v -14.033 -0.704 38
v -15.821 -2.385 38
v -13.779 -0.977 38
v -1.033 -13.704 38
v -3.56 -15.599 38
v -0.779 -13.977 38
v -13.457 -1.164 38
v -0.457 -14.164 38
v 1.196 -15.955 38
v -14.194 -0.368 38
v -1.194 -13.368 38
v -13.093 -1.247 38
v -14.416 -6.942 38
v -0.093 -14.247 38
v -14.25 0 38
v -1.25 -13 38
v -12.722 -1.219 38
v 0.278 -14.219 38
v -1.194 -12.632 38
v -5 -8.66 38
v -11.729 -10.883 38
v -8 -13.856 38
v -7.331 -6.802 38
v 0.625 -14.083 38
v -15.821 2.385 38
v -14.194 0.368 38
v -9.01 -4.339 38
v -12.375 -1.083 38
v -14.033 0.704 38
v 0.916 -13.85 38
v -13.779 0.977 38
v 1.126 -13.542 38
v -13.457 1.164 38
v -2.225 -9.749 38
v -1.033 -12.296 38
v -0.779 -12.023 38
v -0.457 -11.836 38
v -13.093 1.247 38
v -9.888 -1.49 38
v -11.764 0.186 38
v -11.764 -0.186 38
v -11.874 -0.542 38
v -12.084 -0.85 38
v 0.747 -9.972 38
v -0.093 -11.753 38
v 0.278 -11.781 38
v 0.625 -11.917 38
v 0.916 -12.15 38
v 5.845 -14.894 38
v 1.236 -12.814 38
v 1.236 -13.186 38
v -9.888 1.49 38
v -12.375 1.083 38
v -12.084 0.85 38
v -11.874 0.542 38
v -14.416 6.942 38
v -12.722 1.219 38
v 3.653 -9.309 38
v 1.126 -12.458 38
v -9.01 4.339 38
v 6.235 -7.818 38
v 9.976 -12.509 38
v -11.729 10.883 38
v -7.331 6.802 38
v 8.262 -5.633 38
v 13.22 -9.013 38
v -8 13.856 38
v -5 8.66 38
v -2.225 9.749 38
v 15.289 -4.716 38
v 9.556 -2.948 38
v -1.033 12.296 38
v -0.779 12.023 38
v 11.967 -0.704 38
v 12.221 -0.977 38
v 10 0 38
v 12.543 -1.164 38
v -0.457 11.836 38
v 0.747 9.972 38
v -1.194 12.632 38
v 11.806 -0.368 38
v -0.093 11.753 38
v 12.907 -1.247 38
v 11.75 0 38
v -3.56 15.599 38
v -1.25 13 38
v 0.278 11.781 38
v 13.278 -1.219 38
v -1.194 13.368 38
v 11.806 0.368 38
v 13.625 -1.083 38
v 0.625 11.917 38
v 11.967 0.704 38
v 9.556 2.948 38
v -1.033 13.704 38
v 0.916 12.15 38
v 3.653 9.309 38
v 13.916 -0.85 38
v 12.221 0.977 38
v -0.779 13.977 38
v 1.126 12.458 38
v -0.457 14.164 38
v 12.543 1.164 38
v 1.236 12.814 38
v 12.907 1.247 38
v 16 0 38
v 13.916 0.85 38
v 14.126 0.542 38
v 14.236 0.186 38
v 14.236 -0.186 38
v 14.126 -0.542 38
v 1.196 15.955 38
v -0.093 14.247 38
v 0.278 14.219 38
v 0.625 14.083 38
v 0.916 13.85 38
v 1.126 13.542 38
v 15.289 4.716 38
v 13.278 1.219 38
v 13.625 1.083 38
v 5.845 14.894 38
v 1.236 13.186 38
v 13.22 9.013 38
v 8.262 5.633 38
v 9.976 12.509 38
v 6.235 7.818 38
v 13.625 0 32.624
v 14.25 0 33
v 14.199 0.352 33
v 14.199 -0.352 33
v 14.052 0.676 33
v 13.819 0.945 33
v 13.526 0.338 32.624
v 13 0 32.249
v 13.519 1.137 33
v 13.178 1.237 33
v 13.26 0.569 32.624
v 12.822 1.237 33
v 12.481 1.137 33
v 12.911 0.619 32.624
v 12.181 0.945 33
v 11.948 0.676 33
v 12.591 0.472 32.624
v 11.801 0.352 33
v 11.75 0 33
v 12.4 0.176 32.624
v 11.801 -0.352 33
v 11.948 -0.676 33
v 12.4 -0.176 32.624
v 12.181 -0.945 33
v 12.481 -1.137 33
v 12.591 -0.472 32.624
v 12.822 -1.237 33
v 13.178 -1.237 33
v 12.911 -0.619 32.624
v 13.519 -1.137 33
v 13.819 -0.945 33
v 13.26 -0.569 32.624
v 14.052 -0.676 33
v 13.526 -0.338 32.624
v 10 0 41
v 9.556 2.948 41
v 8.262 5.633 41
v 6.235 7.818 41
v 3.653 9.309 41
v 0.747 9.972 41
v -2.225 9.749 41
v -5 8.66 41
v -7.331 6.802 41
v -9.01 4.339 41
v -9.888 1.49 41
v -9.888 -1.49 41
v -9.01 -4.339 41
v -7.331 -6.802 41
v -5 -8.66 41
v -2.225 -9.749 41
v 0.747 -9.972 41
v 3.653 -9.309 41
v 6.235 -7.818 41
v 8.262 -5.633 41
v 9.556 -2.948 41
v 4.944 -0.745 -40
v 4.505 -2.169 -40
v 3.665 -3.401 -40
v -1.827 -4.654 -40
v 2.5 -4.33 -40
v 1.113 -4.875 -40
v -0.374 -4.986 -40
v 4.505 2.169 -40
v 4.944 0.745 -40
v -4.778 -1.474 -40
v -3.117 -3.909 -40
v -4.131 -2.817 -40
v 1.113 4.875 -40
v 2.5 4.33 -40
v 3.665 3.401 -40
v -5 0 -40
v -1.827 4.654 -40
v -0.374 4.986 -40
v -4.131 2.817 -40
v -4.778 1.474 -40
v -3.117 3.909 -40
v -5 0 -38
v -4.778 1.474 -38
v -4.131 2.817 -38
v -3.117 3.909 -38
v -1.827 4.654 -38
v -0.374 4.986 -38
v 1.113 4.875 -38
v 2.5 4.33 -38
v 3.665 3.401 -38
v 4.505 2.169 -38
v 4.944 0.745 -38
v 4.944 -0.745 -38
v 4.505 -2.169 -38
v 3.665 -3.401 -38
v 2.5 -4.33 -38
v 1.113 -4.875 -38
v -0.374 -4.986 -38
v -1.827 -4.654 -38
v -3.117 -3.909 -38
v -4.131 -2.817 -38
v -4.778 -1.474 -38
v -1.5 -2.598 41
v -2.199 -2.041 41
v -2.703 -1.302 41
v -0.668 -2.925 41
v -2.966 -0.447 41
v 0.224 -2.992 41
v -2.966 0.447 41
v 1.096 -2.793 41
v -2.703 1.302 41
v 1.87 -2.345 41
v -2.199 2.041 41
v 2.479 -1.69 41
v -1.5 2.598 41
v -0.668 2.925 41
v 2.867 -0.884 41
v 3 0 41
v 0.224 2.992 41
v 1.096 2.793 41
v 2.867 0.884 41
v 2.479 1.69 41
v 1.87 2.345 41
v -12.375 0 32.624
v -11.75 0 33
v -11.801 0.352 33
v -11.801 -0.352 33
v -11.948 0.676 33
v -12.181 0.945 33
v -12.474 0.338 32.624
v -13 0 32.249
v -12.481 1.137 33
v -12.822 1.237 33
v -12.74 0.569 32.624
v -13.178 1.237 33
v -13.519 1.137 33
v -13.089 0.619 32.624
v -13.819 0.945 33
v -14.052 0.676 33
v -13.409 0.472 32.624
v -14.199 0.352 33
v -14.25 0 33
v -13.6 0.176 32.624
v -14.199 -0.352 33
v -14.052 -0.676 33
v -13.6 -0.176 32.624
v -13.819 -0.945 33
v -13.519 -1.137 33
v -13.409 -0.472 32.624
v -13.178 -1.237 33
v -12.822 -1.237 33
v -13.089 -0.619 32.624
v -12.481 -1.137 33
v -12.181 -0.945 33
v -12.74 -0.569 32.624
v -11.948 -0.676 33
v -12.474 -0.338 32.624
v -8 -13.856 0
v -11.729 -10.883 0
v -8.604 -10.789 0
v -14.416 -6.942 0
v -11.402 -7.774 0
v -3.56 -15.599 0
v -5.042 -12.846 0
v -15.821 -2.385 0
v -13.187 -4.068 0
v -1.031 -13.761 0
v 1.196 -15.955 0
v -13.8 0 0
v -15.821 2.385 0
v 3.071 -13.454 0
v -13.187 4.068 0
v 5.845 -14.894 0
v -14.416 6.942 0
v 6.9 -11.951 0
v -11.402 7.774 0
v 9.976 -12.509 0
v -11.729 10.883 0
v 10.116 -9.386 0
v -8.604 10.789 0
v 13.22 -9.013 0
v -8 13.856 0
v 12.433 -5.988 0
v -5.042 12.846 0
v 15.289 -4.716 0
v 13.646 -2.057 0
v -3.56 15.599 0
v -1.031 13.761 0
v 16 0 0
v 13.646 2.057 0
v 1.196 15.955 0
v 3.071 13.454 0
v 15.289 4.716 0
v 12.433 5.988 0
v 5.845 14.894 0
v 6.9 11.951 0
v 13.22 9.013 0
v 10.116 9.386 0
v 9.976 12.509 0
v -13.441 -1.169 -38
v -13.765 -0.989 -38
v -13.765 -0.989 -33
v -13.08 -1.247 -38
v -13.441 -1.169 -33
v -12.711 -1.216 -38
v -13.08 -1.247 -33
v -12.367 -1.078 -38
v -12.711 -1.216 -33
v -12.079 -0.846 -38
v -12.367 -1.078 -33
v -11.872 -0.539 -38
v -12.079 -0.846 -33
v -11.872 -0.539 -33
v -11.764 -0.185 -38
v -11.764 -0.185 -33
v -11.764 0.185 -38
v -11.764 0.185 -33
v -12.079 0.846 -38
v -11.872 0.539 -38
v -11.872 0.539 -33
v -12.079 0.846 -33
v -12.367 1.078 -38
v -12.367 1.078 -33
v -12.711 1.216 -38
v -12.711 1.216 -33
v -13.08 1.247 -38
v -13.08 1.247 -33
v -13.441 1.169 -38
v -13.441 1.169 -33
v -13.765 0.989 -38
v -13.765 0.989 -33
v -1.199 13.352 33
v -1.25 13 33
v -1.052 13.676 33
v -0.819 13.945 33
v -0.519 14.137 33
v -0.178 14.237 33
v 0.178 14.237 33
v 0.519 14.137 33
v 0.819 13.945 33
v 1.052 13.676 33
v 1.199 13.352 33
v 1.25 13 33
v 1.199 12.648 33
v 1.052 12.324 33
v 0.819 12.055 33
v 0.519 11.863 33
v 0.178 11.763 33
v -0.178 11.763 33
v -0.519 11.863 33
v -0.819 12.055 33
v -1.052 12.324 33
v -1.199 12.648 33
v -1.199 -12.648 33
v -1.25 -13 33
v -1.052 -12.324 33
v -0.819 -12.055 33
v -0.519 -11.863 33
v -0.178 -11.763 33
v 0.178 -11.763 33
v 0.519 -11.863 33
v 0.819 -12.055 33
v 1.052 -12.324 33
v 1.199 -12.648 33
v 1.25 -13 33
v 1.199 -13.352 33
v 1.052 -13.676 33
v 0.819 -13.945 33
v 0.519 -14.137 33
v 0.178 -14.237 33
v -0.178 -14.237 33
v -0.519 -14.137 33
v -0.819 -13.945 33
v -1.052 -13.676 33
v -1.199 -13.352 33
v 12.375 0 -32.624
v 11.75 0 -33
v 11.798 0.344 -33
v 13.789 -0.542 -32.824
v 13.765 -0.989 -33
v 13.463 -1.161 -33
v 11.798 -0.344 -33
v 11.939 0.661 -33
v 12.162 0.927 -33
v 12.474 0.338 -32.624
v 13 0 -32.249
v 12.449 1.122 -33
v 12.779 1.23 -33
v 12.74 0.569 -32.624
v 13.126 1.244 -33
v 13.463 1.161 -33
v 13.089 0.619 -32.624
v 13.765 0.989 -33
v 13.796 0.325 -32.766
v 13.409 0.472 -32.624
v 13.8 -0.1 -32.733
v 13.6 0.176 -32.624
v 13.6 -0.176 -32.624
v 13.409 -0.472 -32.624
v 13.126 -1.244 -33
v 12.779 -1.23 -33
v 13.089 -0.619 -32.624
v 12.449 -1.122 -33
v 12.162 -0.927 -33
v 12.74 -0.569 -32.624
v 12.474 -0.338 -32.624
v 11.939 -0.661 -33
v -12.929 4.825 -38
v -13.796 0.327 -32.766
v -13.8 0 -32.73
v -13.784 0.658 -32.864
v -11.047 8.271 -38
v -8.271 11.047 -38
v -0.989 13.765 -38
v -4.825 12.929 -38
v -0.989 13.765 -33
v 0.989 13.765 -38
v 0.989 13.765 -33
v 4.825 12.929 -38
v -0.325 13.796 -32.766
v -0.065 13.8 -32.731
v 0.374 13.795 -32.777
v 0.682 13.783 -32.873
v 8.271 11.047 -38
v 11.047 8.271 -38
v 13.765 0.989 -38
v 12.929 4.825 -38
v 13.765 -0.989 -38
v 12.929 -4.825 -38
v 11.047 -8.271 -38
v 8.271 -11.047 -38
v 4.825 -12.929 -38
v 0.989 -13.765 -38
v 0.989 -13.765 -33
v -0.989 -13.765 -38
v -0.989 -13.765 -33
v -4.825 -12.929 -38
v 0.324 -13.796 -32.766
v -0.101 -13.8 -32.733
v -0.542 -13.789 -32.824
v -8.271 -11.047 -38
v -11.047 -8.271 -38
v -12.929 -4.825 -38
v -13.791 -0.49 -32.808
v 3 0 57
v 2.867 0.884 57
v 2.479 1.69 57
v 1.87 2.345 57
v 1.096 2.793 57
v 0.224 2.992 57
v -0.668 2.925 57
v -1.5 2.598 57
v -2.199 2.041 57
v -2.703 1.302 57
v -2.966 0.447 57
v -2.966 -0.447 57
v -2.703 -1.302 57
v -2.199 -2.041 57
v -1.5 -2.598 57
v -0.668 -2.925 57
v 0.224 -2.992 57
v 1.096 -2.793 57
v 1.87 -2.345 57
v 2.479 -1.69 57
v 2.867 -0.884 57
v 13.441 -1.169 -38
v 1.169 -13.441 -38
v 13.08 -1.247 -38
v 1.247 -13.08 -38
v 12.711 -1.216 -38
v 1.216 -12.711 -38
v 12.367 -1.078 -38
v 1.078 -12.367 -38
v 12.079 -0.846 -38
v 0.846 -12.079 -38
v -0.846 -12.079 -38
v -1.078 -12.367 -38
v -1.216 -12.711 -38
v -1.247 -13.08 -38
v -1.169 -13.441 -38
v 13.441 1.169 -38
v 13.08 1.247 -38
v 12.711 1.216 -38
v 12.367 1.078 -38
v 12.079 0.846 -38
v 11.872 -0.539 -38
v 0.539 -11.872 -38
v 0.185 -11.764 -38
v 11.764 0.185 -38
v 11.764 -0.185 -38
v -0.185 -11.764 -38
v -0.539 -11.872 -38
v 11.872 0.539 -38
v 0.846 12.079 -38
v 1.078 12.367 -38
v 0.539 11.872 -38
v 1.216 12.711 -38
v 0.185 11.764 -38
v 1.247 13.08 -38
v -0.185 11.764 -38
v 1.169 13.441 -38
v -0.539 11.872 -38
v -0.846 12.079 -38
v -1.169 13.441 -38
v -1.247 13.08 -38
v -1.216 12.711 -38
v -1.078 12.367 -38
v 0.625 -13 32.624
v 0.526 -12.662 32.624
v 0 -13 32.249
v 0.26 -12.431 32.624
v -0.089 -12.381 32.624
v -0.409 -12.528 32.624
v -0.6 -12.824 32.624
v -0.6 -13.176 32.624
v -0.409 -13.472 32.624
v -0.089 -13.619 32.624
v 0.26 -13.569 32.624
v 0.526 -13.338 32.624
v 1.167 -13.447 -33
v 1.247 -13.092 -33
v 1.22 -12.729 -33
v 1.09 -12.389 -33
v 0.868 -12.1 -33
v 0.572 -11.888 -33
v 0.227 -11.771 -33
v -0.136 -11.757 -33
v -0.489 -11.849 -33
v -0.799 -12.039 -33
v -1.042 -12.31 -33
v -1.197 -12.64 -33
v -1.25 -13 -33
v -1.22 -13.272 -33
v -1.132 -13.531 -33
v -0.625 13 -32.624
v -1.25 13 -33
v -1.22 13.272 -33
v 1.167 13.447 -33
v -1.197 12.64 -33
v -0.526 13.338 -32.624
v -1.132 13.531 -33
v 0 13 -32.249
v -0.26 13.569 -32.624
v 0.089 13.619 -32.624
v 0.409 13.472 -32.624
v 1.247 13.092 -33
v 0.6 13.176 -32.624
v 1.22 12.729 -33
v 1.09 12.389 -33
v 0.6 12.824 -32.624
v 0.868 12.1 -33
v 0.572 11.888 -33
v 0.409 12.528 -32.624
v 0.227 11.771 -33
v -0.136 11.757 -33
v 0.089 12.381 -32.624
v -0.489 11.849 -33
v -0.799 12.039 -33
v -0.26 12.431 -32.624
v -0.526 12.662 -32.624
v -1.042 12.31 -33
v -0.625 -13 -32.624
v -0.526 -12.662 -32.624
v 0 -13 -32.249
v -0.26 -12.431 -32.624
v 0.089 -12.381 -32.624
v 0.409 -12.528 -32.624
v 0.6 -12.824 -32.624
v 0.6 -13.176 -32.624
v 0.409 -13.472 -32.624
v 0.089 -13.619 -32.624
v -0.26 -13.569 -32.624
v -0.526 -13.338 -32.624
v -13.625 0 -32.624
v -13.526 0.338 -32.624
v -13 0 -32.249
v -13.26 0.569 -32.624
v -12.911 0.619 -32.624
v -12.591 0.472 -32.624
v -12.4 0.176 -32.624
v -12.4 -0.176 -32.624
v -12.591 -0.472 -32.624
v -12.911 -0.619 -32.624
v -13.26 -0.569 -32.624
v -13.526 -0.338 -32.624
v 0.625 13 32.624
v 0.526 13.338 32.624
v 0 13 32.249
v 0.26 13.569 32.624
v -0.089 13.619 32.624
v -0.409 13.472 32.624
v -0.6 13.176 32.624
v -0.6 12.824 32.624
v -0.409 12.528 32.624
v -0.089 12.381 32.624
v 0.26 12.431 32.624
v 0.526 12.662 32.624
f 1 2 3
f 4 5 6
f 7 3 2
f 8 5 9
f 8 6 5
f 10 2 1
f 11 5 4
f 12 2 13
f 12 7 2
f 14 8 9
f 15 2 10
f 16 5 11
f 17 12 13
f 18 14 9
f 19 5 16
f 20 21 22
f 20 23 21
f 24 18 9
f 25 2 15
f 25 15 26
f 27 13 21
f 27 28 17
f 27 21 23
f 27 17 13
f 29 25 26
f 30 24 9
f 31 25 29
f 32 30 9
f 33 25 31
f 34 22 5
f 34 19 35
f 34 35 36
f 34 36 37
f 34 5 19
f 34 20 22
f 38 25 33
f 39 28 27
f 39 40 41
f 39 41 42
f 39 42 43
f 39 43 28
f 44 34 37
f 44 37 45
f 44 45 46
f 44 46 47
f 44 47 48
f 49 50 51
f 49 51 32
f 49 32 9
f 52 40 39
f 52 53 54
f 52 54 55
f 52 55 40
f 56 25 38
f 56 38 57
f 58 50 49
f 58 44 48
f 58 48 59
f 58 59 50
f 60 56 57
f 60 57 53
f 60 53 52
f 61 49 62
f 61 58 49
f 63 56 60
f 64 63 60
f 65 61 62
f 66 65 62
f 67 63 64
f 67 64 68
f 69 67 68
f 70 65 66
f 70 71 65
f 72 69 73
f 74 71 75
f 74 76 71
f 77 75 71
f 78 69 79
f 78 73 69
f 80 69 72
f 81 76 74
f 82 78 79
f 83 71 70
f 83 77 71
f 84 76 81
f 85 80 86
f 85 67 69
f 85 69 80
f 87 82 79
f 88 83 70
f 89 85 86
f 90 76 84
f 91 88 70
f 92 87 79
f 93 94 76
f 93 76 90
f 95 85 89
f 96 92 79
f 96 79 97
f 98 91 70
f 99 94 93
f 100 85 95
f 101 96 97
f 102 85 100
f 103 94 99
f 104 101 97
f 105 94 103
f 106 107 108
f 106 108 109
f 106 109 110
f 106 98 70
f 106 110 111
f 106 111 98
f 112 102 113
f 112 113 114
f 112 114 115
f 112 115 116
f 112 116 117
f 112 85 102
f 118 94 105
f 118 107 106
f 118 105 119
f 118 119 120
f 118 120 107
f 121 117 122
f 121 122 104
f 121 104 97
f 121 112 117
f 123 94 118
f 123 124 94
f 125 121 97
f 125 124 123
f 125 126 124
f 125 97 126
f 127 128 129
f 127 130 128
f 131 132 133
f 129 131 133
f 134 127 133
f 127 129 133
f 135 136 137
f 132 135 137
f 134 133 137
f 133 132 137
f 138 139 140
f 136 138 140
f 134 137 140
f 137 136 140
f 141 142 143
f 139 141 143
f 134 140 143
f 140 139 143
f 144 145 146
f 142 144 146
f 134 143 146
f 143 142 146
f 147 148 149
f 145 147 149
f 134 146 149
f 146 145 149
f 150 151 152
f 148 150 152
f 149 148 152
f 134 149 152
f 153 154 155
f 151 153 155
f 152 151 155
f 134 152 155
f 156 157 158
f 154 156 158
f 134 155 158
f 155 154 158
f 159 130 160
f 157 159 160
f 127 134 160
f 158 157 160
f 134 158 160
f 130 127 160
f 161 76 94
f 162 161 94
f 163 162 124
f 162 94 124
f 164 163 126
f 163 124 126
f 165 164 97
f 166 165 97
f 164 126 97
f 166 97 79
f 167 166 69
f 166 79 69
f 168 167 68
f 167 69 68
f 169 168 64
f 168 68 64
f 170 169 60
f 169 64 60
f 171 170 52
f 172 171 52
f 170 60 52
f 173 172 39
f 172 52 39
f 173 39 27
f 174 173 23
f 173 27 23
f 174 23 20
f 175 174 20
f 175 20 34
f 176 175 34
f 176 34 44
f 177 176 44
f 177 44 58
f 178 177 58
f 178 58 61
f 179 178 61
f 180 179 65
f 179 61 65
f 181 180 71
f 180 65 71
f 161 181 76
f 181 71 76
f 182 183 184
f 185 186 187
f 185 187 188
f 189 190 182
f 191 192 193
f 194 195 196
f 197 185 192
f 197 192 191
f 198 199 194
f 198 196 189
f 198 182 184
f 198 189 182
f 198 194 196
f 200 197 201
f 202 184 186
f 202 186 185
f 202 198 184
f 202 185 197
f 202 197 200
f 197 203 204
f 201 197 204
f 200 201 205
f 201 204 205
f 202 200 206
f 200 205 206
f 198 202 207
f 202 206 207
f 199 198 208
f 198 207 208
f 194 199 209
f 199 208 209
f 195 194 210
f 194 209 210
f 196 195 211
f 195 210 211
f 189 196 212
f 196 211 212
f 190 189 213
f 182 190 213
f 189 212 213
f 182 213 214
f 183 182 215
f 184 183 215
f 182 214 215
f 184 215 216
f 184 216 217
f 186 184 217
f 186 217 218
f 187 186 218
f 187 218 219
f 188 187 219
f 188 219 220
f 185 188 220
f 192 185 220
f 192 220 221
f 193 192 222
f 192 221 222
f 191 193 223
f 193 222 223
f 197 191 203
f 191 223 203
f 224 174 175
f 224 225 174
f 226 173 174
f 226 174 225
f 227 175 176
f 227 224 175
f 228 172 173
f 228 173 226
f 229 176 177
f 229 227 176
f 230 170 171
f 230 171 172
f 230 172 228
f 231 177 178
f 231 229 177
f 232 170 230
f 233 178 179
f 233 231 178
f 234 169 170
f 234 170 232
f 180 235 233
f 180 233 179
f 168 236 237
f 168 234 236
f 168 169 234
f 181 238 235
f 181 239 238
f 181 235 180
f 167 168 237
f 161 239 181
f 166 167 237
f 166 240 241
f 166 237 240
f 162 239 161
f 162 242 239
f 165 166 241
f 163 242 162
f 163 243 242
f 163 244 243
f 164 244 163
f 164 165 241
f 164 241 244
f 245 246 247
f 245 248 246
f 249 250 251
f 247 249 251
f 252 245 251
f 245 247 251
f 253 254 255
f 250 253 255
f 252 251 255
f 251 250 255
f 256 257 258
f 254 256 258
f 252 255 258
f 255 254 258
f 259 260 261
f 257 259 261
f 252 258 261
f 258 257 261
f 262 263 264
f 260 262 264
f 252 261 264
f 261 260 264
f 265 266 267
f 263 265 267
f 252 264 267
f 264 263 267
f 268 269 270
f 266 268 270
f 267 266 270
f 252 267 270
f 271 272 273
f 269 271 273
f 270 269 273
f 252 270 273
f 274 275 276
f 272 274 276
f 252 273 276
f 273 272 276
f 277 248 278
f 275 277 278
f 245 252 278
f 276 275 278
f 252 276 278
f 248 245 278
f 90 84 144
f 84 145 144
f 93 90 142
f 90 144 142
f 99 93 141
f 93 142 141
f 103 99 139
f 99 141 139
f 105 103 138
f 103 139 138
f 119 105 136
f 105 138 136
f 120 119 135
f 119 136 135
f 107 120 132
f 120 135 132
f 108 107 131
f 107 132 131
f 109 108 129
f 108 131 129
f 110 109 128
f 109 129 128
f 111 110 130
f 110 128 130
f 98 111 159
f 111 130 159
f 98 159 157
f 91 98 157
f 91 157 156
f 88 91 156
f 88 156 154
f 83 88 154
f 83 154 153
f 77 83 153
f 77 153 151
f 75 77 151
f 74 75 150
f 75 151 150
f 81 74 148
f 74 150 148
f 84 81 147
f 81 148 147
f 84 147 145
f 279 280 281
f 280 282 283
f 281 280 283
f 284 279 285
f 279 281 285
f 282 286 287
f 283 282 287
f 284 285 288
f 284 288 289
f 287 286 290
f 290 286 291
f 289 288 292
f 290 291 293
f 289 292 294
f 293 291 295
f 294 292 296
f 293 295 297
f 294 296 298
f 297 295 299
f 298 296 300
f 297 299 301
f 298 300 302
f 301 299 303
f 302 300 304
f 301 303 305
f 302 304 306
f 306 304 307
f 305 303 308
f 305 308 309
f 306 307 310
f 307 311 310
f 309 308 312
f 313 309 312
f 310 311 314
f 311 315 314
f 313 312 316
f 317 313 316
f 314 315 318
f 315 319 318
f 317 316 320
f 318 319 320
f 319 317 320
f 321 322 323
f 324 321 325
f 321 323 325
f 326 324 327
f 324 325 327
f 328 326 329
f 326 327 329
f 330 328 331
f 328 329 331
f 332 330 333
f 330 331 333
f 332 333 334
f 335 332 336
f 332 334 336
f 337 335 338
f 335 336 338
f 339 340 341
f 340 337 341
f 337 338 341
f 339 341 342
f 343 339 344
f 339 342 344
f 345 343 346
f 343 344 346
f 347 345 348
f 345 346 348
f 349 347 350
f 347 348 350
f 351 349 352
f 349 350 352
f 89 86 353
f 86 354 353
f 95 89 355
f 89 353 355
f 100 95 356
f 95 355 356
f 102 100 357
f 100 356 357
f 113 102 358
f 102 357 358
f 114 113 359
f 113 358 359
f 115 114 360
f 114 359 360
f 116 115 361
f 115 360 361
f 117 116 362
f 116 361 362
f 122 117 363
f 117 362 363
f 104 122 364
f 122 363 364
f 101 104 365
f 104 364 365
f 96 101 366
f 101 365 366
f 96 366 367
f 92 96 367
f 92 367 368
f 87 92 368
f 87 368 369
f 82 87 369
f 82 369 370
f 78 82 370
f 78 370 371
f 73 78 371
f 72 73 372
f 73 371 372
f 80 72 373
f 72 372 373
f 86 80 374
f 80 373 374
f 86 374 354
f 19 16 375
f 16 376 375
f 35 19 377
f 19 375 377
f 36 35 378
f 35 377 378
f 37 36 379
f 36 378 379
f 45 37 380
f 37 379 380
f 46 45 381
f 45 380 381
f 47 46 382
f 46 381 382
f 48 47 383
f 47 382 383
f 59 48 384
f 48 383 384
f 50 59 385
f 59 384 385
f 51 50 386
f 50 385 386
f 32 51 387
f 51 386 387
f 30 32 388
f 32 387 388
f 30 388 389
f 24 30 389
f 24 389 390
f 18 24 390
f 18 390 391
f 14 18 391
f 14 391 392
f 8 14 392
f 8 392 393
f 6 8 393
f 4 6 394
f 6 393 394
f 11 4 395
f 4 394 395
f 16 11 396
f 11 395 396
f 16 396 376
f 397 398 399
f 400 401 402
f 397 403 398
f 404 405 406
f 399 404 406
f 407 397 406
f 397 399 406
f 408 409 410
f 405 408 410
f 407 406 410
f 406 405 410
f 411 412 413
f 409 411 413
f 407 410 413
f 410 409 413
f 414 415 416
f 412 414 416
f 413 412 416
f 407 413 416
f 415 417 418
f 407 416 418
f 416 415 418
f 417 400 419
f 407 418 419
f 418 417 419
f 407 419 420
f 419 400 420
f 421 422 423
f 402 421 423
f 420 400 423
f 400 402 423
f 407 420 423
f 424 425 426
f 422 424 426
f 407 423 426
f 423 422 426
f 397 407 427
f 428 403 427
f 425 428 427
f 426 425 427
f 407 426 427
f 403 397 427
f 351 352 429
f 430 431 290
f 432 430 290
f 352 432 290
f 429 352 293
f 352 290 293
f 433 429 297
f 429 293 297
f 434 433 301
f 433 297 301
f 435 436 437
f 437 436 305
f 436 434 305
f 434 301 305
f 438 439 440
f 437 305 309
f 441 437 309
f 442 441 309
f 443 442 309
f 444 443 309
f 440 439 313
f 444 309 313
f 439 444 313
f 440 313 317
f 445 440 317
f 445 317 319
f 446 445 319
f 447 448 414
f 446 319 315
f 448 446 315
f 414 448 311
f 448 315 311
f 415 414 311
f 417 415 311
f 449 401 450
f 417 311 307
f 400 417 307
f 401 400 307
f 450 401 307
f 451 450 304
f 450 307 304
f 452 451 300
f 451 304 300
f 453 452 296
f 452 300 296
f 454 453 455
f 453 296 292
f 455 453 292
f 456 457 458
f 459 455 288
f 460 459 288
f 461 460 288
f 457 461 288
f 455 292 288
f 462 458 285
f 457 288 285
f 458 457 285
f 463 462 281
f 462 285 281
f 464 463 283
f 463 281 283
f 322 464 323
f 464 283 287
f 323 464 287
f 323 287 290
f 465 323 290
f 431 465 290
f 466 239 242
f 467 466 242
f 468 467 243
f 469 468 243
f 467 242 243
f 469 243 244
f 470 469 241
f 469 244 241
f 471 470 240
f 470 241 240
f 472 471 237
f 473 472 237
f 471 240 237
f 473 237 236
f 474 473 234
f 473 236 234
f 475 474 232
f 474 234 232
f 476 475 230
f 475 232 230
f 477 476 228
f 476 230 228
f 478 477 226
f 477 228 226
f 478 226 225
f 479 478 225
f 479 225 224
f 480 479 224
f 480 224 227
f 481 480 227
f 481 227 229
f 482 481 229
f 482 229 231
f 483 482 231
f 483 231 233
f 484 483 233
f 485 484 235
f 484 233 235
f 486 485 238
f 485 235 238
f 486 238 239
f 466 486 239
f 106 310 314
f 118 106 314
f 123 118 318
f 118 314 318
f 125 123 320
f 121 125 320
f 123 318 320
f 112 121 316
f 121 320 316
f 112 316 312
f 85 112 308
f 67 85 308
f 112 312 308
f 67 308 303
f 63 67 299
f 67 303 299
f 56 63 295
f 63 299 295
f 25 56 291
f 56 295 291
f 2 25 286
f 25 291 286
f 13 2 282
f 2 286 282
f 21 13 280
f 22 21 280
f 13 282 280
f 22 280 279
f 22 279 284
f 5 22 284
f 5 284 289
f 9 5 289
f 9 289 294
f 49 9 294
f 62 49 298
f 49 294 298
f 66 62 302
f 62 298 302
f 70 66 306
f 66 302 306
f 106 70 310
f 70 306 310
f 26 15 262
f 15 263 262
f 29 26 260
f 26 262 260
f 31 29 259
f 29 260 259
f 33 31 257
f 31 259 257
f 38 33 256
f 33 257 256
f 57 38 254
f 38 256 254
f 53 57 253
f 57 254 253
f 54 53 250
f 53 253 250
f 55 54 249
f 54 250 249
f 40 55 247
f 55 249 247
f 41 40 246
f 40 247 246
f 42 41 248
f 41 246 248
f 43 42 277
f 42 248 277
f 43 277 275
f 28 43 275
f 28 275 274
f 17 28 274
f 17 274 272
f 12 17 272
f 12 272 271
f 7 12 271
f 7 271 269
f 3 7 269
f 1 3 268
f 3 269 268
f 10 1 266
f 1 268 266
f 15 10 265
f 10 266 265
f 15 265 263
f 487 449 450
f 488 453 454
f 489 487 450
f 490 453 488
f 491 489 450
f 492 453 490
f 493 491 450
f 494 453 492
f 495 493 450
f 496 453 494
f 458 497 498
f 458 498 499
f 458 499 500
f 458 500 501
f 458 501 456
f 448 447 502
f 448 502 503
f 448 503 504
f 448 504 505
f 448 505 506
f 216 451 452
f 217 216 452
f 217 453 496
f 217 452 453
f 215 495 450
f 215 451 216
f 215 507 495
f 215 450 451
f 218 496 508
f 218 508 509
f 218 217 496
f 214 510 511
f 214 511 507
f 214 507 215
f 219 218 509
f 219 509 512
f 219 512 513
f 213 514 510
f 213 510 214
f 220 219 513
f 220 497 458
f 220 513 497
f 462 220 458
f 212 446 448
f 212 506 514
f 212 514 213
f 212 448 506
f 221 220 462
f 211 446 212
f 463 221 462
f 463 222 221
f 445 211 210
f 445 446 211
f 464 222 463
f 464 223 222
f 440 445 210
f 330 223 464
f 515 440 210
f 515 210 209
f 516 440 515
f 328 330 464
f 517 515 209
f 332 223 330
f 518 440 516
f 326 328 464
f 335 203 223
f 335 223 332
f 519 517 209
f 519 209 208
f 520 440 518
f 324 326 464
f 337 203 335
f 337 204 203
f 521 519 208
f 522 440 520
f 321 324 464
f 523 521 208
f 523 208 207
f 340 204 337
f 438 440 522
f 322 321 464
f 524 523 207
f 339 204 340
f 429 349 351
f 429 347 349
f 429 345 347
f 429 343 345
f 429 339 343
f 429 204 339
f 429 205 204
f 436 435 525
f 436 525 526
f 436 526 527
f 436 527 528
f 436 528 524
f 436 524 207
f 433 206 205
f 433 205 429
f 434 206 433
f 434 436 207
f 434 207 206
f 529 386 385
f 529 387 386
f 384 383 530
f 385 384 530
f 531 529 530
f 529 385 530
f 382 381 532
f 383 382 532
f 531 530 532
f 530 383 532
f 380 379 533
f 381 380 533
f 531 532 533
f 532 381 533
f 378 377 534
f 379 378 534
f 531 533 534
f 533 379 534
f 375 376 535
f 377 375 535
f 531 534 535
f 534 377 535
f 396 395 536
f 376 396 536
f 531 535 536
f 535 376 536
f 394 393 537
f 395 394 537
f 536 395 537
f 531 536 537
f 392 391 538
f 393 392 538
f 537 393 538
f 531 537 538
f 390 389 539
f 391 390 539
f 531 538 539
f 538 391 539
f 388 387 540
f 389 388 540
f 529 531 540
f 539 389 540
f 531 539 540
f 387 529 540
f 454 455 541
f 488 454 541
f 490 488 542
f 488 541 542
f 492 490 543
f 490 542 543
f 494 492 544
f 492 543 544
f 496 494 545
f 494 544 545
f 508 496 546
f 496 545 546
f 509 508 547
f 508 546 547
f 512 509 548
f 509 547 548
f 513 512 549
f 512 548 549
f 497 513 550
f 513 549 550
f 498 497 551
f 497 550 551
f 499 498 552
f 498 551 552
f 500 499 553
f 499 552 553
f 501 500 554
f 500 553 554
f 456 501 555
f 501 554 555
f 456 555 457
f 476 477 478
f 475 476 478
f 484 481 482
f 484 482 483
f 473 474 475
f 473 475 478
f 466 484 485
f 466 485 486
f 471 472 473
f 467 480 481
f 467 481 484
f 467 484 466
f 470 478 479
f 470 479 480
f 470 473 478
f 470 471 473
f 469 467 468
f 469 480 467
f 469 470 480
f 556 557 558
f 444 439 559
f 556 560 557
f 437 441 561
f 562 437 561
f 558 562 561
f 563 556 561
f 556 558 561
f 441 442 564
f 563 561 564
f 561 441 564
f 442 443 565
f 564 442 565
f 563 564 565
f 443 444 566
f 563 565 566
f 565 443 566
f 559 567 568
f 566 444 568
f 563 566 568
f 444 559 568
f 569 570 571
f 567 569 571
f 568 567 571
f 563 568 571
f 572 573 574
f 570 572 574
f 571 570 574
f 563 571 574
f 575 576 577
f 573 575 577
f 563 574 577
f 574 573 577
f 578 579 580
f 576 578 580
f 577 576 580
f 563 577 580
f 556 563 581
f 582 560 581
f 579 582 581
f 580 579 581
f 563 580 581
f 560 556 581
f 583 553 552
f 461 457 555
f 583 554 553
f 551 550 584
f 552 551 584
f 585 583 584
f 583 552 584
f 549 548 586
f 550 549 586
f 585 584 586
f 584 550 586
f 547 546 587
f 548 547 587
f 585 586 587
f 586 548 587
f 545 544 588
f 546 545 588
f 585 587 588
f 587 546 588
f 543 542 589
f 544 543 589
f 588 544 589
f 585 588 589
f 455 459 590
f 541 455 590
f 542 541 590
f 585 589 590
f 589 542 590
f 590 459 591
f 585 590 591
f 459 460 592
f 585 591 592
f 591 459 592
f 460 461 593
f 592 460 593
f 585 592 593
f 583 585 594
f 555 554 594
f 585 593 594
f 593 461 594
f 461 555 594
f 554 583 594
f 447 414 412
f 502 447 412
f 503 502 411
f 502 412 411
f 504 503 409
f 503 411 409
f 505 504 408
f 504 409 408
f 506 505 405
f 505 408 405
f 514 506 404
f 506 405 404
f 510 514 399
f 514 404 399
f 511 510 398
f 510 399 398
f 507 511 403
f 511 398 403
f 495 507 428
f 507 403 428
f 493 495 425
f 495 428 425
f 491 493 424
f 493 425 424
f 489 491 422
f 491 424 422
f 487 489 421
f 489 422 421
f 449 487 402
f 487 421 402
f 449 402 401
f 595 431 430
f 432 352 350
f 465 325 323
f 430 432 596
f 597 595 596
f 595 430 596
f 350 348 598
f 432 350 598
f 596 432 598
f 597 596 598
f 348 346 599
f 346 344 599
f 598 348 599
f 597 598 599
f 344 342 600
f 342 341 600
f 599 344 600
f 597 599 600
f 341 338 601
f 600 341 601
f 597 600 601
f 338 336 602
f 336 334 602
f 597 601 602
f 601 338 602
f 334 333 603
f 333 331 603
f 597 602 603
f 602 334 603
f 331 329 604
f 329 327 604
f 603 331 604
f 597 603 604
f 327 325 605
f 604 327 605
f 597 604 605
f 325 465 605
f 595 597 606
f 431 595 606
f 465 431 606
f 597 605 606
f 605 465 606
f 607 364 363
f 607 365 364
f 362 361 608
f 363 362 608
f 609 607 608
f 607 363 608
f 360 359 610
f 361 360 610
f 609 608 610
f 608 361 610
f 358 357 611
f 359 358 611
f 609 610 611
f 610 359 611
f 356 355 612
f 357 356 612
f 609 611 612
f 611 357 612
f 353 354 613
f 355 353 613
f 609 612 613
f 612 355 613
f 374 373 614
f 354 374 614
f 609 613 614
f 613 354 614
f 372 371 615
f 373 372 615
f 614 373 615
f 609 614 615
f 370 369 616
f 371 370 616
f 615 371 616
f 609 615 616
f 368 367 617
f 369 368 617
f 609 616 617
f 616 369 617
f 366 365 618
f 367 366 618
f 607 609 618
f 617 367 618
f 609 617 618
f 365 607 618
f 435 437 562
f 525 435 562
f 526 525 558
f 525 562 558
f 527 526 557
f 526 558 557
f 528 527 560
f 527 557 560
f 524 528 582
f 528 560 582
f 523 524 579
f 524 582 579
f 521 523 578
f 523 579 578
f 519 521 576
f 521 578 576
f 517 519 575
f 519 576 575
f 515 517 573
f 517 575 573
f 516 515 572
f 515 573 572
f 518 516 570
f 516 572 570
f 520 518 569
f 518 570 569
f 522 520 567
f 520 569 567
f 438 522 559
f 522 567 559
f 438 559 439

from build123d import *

# Parameters (mm, degrees)
SKETCH1_R                   = 16
BOSS_EXTRUDE1_DEPTH         = 38
SKETCH2_R                   = 13.8
BOSS_EXTRUDE2_DEPTH         = 38
SKETCH3_R                   = 5
BOSS_EXTRUDE3_DEPTH         = 2
SKETCH4_R                   = 10
BOSS_EXTRUDE4_DEPTH         = 3
SKETCH5_R                   = 3
BOSS_EXTRUDE5_DEPTH         = 16
TAP_DRILL_FOR_M3_TAP1_D     = 2.5
TAP_DRILL_FOR_M3_TAP1_DEPTH = 5
TAP_DRILL_FOR_M3_TAP1_TIP   = 0.751075774
TAP_DRILL_FOR_M3_TAP2_D     = 2.5
TAP_DRILL_FOR_M3_TAP2_DEPTH = 5
TAP_DRILL_FOR_M3_TAP2_TIP   = 0.751075774


with BuildPart() as part:
    # Sketch1 → Boss-Extrude1 (new body)
    with BuildSketch(Plane.XY):
        Circle(SKETCH1_R)
    extrude(amount=BOSS_EXTRUDE1_DEPTH)

    # Sketch2 → Boss-Extrude2 (add)
    with BuildSketch(Plane(origin=(0, 0, 0), x_dir=(-1, 0, 0), z_dir=(0, 0, -1))):
        Circle(SKETCH2_R)
    extrude(amount=BOSS_EXTRUDE2_DEPTH)

    # Sketch3 → Boss-Extrude3 (add)
    with BuildSketch(Plane(origin=(0, 0, -38), x_dir=(-1, 0, 0), z_dir=(0, 0, -1))):
        Circle(SKETCH3_R)
    extrude(amount=BOSS_EXTRUDE3_DEPTH)

    # Sketch4 → Boss-Extrude4 (add)
    with BuildSketch(Plane.XY.offset(38)):
        Circle(SKETCH4_R)
    extrude(amount=BOSS_EXTRUDE4_DEPTH)

    # Sketch5 → Boss-Extrude5 (add)
    with BuildSketch(Plane.XY.offset(41)):
        Circle(SKETCH5_R)
    extrude(amount=BOSS_EXTRUDE5_DEPTH)

    # Tap Drill for M3 Tap1
    with Locations(Plane(origin=(0, 0, -38), x_dir=(-1, 0, 0), z_dir=(0, 0, -1))):
        with Locations((-13, 0), (0, -13), (13, 0), (0, 13)):
            Hole(TAP_DRILL_FOR_M3_TAP1_D / 2, depth=TAP_DRILL_FOR_M3_TAP1_DEPTH)
            with Locations((0, 0, -(TAP_DRILL_FOR_M3_TAP1_DEPTH + TAP_DRILL_FOR_M3_TAP1_TIP / 2))):  # 118° drill point
                Cone(0, TAP_DRILL_FOR_M3_TAP1_D / 2, TAP_DRILL_FOR_M3_TAP1_TIP, mode=Mode.SUBTRACT)

    # Tap Drill for M3 Tap2
    with Locations(Plane.XY.offset(38)):
        with Locations((0, 13), (-13, 0), (0, -13), (13, 0)):
            Hole(TAP_DRILL_FOR_M3_TAP2_D / 2, depth=TAP_DRILL_FOR_M3_TAP2_DEPTH)
            with Locations((0, 0, -(TAP_DRILL_FOR_M3_TAP2_DEPTH + TAP_DRILL_FOR_M3_TAP2_TIP / 2))):  # 118° drill point
                Cone(0, TAP_DRILL_FOR_M3_TAP2_D / 2, TAP_DRILL_FOR_M3_TAP2_TIP, mode=Mode.SUBTRACT)


solid = part.part
